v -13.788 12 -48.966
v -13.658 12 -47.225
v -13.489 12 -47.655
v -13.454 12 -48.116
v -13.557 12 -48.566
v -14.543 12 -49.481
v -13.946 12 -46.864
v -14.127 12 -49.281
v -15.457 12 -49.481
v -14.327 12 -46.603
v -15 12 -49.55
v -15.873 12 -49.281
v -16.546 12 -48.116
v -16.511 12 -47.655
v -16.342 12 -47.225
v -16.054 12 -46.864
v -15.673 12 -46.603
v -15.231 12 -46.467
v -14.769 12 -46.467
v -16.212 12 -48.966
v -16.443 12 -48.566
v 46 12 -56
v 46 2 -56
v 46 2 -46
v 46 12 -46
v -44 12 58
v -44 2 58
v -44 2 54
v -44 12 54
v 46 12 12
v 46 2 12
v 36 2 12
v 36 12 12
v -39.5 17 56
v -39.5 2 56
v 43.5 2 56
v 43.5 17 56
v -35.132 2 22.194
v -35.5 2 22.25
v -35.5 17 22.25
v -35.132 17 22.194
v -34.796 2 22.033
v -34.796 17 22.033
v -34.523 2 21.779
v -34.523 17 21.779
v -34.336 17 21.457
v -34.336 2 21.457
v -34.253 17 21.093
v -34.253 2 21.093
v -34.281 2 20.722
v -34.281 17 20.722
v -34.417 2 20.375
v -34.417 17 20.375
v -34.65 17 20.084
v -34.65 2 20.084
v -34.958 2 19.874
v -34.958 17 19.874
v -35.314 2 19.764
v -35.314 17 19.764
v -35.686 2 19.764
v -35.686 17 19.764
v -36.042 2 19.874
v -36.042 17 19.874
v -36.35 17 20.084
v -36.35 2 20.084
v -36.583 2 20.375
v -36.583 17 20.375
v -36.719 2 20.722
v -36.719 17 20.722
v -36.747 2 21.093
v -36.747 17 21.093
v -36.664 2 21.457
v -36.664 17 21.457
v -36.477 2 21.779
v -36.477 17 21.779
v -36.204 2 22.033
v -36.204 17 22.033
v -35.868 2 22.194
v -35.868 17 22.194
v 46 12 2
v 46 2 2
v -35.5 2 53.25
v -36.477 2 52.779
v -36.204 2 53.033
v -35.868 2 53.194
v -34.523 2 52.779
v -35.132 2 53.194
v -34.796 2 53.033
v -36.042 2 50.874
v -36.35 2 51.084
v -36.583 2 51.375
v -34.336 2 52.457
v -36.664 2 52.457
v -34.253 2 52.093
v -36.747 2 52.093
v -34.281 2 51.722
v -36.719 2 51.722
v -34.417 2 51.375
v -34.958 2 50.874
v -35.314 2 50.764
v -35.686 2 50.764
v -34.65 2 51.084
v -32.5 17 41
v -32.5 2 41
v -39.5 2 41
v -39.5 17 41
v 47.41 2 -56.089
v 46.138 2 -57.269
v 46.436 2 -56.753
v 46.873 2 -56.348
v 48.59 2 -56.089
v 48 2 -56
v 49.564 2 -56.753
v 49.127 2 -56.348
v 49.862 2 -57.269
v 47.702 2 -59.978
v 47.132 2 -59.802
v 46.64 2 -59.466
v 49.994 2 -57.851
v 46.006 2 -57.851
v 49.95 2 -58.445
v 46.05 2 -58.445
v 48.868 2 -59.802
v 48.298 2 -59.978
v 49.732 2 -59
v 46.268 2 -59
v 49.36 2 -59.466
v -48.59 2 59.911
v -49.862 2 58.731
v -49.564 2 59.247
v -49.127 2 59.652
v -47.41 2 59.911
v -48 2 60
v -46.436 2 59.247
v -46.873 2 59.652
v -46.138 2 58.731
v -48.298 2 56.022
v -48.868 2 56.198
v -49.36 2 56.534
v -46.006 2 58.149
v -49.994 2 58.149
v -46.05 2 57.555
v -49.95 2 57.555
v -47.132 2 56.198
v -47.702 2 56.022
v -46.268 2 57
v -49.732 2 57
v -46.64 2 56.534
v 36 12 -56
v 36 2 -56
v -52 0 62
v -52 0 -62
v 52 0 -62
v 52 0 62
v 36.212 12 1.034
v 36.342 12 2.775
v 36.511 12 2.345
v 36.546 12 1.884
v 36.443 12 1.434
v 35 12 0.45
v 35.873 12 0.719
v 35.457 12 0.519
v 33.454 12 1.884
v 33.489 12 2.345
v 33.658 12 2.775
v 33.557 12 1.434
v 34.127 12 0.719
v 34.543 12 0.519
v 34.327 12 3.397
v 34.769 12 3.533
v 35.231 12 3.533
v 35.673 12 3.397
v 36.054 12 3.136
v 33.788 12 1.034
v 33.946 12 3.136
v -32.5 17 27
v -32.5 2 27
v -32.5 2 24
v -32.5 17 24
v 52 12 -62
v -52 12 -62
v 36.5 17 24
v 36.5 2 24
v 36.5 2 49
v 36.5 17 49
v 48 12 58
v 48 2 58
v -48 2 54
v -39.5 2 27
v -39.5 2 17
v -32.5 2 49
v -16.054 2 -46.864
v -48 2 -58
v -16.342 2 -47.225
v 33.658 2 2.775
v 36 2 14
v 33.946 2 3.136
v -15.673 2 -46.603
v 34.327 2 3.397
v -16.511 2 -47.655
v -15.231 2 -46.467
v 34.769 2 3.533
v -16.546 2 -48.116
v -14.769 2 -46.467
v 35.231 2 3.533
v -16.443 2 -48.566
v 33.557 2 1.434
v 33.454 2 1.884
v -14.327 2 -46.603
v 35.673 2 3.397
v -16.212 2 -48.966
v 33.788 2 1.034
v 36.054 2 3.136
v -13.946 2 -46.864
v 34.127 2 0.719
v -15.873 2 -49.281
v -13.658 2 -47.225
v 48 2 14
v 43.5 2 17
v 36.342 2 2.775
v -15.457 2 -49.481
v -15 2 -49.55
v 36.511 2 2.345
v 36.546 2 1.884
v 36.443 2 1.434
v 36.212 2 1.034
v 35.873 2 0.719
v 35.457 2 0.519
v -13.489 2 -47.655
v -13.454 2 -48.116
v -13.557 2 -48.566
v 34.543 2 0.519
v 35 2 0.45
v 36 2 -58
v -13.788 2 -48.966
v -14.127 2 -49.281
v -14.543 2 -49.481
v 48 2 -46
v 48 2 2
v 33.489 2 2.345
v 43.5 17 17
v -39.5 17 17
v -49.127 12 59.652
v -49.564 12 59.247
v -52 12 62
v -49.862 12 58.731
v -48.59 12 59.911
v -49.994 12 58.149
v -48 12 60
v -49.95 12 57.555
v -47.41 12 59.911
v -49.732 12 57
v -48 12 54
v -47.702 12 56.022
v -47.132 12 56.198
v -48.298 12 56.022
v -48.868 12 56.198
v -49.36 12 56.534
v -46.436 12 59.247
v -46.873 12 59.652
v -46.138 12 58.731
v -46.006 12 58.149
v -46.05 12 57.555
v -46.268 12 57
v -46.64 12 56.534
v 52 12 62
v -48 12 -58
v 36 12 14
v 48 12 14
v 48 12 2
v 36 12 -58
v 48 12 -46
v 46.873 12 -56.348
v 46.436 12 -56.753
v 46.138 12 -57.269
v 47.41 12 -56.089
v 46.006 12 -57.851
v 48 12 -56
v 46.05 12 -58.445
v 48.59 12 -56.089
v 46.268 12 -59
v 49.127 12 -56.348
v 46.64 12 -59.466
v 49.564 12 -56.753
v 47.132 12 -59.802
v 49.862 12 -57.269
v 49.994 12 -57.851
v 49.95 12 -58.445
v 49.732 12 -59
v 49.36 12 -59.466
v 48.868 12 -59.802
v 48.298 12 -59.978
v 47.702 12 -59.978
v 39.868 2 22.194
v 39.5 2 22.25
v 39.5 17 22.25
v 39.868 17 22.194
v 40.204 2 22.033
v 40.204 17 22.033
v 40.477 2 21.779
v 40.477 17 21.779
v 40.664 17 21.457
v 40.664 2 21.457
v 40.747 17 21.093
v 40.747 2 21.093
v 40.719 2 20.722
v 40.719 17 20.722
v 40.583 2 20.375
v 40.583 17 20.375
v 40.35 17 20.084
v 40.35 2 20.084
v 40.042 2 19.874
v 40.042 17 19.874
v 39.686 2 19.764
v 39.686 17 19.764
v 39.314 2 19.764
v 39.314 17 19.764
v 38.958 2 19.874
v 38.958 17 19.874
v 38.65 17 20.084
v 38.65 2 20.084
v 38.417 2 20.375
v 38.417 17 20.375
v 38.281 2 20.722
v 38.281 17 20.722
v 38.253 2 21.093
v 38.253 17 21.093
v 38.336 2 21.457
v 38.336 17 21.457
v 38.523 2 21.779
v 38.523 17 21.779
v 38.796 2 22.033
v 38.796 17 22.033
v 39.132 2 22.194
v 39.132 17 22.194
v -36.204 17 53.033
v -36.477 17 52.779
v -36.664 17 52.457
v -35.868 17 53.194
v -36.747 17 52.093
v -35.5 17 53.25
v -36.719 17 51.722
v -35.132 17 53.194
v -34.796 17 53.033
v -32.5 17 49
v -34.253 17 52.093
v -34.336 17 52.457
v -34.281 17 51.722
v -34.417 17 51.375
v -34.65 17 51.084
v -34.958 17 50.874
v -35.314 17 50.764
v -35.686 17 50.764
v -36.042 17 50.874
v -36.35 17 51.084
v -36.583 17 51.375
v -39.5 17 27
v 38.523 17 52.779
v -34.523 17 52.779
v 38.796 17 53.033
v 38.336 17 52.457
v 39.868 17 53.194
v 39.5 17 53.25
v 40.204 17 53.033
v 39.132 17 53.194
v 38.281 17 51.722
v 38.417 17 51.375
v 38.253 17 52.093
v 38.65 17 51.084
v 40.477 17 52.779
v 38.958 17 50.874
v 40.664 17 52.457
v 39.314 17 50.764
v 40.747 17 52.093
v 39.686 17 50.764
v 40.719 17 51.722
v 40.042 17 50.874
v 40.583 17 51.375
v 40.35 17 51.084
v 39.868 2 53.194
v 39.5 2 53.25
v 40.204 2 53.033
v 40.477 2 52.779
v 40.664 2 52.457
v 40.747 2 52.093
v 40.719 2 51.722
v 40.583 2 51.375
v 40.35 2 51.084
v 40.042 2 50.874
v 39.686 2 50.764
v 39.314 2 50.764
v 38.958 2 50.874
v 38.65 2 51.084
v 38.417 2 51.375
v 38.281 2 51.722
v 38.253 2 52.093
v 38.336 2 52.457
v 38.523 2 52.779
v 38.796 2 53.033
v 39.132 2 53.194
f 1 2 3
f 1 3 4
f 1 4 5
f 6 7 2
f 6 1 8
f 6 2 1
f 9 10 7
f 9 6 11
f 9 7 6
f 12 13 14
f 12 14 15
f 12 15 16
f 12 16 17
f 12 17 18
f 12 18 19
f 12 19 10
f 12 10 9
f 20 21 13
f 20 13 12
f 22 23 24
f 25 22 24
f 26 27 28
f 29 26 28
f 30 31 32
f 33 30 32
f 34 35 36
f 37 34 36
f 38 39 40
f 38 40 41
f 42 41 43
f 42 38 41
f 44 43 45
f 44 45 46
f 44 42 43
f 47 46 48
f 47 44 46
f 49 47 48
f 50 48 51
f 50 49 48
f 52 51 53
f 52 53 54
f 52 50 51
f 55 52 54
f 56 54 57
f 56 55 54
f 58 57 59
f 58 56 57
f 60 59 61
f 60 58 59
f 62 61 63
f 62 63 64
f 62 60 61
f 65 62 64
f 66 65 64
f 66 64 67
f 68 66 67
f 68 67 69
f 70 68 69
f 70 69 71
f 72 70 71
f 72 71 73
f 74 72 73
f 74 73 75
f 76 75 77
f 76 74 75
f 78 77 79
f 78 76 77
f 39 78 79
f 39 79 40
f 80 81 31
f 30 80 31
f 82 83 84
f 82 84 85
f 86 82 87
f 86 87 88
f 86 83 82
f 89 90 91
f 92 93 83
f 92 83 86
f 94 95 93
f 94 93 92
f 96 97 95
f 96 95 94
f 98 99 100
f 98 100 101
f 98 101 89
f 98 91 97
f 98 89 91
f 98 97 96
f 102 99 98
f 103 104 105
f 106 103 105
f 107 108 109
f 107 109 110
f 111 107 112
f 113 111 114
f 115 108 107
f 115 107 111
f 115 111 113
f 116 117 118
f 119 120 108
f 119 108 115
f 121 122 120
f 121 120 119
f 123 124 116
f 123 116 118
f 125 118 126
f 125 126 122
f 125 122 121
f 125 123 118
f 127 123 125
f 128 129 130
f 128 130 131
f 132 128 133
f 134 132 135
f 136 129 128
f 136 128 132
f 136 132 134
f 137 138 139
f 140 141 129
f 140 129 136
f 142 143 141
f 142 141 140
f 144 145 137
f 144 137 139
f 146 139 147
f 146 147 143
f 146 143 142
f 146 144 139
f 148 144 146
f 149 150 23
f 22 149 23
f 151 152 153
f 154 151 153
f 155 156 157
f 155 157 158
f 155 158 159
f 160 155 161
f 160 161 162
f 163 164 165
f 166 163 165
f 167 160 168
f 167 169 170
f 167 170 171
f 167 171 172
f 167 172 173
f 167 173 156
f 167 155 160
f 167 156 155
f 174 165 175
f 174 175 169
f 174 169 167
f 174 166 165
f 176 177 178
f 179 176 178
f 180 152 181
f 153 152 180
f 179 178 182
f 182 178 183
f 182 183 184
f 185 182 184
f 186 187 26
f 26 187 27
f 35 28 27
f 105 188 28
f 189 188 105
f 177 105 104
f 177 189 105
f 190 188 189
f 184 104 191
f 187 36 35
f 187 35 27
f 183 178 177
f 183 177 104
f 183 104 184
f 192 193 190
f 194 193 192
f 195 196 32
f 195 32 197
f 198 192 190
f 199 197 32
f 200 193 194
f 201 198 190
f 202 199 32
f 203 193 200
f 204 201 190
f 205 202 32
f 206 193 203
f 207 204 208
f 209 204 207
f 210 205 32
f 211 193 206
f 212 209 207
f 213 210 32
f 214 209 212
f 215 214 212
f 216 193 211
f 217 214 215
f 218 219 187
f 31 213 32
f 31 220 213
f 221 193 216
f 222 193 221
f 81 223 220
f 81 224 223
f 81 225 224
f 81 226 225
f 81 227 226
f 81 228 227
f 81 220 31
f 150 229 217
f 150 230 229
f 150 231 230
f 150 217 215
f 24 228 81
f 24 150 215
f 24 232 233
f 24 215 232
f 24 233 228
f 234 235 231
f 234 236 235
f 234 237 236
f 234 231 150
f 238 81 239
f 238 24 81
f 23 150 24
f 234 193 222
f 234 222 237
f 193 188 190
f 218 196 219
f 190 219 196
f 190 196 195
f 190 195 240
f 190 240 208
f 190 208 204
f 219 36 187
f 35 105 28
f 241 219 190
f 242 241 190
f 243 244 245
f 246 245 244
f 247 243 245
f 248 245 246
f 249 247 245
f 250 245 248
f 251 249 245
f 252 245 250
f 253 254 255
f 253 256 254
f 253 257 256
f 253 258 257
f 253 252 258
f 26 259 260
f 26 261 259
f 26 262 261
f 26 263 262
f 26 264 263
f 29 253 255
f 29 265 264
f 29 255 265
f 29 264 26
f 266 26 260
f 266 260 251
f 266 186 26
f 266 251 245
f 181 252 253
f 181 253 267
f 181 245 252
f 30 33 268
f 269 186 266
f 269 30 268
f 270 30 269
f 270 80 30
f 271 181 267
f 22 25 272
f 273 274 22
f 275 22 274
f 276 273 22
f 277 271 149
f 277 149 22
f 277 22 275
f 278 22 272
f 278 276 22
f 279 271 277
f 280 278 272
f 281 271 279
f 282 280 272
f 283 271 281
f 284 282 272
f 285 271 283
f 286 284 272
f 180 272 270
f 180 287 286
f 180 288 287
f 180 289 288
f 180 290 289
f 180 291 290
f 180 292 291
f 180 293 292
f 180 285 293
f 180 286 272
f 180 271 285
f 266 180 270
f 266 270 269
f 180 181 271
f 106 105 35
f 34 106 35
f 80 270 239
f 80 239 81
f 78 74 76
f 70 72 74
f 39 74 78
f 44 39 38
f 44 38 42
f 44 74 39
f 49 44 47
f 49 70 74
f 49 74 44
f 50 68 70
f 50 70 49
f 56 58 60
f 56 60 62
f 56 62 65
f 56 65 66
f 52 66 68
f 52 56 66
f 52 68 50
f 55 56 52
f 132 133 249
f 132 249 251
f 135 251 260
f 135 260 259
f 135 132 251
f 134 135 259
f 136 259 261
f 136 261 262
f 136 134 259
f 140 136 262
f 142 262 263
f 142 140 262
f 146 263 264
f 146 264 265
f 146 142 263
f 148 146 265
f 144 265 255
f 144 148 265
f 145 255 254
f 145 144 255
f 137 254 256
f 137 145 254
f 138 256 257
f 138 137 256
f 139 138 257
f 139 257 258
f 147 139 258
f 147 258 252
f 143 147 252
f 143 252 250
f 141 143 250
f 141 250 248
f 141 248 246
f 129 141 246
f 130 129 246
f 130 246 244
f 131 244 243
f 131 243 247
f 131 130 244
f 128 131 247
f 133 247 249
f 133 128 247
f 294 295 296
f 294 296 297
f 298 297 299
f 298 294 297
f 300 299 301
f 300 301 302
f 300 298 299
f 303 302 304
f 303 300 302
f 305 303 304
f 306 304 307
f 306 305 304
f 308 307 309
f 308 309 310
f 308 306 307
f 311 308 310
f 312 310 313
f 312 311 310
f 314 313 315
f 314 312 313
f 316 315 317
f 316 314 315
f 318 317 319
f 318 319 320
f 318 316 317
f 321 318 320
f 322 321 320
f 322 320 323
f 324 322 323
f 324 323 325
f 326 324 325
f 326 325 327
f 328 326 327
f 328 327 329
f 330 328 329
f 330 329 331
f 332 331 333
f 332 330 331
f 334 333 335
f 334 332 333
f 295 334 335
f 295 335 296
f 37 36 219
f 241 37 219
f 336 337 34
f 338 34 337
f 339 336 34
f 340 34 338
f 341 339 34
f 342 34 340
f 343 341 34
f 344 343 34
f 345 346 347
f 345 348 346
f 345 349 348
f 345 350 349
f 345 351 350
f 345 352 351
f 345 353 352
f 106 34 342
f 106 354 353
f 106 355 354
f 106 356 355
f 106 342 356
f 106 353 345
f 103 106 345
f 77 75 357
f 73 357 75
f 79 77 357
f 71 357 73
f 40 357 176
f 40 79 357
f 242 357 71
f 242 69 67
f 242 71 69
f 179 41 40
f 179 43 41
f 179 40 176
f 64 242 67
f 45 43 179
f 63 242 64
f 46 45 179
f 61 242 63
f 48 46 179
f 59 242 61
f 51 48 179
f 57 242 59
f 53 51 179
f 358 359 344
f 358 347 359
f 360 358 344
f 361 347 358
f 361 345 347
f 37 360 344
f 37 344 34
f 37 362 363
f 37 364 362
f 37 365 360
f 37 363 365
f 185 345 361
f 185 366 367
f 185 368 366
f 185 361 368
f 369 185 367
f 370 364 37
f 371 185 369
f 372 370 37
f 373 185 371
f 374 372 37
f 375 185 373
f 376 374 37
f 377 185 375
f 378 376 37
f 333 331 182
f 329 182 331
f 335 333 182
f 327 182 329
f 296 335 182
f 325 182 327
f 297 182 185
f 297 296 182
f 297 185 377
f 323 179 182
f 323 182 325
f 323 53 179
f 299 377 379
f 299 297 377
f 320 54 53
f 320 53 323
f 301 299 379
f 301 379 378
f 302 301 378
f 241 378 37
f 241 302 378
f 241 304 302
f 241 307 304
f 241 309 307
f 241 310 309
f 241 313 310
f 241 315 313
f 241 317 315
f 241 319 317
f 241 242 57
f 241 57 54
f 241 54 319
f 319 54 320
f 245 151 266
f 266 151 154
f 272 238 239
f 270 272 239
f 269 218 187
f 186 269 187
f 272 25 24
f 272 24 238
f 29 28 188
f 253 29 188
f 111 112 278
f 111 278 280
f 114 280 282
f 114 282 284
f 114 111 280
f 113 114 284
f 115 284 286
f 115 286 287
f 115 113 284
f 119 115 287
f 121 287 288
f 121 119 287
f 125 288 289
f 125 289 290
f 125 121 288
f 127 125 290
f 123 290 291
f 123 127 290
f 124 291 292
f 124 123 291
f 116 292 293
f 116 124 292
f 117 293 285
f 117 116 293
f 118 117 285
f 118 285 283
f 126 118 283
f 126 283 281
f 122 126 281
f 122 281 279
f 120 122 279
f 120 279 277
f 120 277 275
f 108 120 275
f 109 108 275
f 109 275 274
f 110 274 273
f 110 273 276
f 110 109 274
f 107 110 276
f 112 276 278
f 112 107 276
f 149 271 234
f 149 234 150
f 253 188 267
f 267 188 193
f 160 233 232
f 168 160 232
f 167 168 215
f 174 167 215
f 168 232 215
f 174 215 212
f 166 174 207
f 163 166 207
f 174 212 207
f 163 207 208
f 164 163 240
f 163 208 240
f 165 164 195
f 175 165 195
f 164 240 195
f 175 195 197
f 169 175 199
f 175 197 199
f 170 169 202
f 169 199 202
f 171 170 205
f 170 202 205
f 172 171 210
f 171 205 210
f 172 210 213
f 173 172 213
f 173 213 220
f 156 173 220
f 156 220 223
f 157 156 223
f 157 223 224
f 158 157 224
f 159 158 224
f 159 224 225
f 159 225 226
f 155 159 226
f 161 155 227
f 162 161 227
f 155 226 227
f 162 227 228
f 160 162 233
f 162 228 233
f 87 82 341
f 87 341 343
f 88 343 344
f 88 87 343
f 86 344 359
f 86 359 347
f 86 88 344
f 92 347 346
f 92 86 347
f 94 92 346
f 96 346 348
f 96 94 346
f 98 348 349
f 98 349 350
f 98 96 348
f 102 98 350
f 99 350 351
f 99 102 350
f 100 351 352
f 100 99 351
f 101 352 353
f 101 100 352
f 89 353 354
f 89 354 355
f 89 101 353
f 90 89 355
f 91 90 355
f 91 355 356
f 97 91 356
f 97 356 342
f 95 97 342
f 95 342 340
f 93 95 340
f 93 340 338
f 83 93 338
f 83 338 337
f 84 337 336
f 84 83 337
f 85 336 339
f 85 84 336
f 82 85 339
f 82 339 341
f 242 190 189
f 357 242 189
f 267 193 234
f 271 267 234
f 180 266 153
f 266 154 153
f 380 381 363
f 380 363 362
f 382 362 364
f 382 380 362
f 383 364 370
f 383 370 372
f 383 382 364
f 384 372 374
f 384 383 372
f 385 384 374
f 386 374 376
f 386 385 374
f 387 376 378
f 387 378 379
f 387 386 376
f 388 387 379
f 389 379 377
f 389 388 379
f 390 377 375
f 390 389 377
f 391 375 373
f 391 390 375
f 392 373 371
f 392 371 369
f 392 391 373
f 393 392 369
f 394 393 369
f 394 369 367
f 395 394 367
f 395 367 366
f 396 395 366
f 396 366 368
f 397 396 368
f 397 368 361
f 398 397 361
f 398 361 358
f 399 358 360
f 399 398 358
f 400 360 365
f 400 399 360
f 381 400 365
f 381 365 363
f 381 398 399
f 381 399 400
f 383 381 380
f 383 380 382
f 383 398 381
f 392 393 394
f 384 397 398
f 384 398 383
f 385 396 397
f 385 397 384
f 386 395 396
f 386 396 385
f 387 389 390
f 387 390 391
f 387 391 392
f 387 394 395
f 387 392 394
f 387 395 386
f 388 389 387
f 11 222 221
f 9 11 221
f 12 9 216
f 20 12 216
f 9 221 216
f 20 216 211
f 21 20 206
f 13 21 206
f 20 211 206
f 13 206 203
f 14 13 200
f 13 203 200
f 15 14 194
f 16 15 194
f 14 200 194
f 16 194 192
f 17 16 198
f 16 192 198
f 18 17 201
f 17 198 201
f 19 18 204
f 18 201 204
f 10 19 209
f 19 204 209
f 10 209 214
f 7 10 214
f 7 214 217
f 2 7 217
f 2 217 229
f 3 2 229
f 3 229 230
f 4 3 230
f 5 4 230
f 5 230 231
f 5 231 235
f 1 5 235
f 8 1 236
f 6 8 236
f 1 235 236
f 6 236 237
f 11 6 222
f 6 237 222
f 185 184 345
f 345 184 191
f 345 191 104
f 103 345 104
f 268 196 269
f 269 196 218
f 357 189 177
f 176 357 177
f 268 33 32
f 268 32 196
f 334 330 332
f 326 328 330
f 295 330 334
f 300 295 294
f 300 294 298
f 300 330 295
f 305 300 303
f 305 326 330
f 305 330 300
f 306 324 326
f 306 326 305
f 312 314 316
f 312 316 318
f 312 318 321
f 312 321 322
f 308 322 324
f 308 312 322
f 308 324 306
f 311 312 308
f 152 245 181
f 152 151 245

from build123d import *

# Parameters (mm, degrees)
SKETCH1_W           = 104
SKETCH1_H           = 124
BOSS_EXTRUDE1_DEPTH = 2
SKETCH2_W           = 104
SKETCH2_H           = 124
SKETCH2_R           = 2
SKETCH2_R_2         = 1.55
BOSS_EXTRUDE2_DEPTH = 10
SKETCH3_R           = 1.25
BOSS_EXTRUDE3_DEPTH = 15


with BuildPart() as part:
    # Sketch1 → Boss-Extrude1 (new body)
    with BuildSketch(Plane(origin=(0, 0, 0), x_dir=(1, 0, 0), z_dir=(0, 1, 0))):
        Rectangle(SKETCH1_W, SKETCH1_H)
    extrude(amount=BOSS_EXTRUDE1_DEPTH)

    # Sketch2 → Boss-Extrude2 (add)
    # profile 1 of 3: a face of its own
    with BuildSketch(Plane(origin=(0, 2, 0), x_dir=(1, 0, 0), z_dir=(0, 1, 0))):
        Rectangle(SKETCH2_W, SKETCH2_H)
        Polygon((36, -14), (48, -14), (48, -58), (-44, -58), (-44, -54), (-48, -54), (-48, 58), (36, 58), (36, 56), (46, 56), (46, 46), (48, 46), (48, -2), (46, -2), (46, -12), (36, -12), align=None, mode=Mode.SUBTRACT)
        with Locations(Location((48, 58, 0), (0, 0, 270))):
            Circle(SKETCH2_R, mode=Mode.SUBTRACT)
        with Locations(Location((-48, -58, 0), (0, 0, 270))):
            Circle(SKETCH2_R, mode=Mode.SUBTRACT)
    # profile 2 of 3: a face of its own
    with BuildSketch(Plane(origin=(0, 2, 0), x_dir=(1, 0, 0), z_dir=(0, 1, 0))):
        with Locations(Location((-15, 48, 0), (0, 0, 90))):
            Circle(SKETCH2_R_2)
    # profile 3 of 3: a face of its own
    with BuildSketch(Plane(origin=(0, 2, 0), x_dir=(1, 0, 0), z_dir=(0, 1, 0))):
        with Locations(Location((35, -2, 0), (0, 0, 90))):
            Circle(SKETCH2_R_2)
    extrude(amount=BOSS_EXTRUDE2_DEPTH)

    # Sketch3 → Boss-Extrude3 (add)
    with BuildSketch(Plane(origin=(0, 2, 0), x_dir=(1, 0, 0), z_dir=(0, 1, 0))):
        Polygon((36.5, -49), (-32.5, -49), (-32.5, -41), (-39.5, -41), (-39.5, -56), (43.5, -56), (43.5, -17), (-39.5, -17), (-39.5, -27), (-32.5, -27), (-32.5, -24), (36.5, -24), align=None)
        with Locations(Location((-35.5, -52, 0), (0, 0, 270))):
            Circle(SKETCH3_R, mode=Mode.SUBTRACT)
        with Locations(Location((39.5, -52, 0), (0, 0, 270))):
            Circle(SKETCH3_R, mode=Mode.SUBTRACT)
        with Locations(Location((-35.5, -21, 0), (0, 0, 270))):
            Circle(SKETCH3_R, mode=Mode.SUBTRACT)
        with Locations(Location((39.5, -21, 0), (0, 0, 270))):
            Circle(SKETCH3_R, mode=Mode.SUBTRACT)
    extrude(amount=BOSS_EXTRUDE3_DEPTH)


solid = part.part
